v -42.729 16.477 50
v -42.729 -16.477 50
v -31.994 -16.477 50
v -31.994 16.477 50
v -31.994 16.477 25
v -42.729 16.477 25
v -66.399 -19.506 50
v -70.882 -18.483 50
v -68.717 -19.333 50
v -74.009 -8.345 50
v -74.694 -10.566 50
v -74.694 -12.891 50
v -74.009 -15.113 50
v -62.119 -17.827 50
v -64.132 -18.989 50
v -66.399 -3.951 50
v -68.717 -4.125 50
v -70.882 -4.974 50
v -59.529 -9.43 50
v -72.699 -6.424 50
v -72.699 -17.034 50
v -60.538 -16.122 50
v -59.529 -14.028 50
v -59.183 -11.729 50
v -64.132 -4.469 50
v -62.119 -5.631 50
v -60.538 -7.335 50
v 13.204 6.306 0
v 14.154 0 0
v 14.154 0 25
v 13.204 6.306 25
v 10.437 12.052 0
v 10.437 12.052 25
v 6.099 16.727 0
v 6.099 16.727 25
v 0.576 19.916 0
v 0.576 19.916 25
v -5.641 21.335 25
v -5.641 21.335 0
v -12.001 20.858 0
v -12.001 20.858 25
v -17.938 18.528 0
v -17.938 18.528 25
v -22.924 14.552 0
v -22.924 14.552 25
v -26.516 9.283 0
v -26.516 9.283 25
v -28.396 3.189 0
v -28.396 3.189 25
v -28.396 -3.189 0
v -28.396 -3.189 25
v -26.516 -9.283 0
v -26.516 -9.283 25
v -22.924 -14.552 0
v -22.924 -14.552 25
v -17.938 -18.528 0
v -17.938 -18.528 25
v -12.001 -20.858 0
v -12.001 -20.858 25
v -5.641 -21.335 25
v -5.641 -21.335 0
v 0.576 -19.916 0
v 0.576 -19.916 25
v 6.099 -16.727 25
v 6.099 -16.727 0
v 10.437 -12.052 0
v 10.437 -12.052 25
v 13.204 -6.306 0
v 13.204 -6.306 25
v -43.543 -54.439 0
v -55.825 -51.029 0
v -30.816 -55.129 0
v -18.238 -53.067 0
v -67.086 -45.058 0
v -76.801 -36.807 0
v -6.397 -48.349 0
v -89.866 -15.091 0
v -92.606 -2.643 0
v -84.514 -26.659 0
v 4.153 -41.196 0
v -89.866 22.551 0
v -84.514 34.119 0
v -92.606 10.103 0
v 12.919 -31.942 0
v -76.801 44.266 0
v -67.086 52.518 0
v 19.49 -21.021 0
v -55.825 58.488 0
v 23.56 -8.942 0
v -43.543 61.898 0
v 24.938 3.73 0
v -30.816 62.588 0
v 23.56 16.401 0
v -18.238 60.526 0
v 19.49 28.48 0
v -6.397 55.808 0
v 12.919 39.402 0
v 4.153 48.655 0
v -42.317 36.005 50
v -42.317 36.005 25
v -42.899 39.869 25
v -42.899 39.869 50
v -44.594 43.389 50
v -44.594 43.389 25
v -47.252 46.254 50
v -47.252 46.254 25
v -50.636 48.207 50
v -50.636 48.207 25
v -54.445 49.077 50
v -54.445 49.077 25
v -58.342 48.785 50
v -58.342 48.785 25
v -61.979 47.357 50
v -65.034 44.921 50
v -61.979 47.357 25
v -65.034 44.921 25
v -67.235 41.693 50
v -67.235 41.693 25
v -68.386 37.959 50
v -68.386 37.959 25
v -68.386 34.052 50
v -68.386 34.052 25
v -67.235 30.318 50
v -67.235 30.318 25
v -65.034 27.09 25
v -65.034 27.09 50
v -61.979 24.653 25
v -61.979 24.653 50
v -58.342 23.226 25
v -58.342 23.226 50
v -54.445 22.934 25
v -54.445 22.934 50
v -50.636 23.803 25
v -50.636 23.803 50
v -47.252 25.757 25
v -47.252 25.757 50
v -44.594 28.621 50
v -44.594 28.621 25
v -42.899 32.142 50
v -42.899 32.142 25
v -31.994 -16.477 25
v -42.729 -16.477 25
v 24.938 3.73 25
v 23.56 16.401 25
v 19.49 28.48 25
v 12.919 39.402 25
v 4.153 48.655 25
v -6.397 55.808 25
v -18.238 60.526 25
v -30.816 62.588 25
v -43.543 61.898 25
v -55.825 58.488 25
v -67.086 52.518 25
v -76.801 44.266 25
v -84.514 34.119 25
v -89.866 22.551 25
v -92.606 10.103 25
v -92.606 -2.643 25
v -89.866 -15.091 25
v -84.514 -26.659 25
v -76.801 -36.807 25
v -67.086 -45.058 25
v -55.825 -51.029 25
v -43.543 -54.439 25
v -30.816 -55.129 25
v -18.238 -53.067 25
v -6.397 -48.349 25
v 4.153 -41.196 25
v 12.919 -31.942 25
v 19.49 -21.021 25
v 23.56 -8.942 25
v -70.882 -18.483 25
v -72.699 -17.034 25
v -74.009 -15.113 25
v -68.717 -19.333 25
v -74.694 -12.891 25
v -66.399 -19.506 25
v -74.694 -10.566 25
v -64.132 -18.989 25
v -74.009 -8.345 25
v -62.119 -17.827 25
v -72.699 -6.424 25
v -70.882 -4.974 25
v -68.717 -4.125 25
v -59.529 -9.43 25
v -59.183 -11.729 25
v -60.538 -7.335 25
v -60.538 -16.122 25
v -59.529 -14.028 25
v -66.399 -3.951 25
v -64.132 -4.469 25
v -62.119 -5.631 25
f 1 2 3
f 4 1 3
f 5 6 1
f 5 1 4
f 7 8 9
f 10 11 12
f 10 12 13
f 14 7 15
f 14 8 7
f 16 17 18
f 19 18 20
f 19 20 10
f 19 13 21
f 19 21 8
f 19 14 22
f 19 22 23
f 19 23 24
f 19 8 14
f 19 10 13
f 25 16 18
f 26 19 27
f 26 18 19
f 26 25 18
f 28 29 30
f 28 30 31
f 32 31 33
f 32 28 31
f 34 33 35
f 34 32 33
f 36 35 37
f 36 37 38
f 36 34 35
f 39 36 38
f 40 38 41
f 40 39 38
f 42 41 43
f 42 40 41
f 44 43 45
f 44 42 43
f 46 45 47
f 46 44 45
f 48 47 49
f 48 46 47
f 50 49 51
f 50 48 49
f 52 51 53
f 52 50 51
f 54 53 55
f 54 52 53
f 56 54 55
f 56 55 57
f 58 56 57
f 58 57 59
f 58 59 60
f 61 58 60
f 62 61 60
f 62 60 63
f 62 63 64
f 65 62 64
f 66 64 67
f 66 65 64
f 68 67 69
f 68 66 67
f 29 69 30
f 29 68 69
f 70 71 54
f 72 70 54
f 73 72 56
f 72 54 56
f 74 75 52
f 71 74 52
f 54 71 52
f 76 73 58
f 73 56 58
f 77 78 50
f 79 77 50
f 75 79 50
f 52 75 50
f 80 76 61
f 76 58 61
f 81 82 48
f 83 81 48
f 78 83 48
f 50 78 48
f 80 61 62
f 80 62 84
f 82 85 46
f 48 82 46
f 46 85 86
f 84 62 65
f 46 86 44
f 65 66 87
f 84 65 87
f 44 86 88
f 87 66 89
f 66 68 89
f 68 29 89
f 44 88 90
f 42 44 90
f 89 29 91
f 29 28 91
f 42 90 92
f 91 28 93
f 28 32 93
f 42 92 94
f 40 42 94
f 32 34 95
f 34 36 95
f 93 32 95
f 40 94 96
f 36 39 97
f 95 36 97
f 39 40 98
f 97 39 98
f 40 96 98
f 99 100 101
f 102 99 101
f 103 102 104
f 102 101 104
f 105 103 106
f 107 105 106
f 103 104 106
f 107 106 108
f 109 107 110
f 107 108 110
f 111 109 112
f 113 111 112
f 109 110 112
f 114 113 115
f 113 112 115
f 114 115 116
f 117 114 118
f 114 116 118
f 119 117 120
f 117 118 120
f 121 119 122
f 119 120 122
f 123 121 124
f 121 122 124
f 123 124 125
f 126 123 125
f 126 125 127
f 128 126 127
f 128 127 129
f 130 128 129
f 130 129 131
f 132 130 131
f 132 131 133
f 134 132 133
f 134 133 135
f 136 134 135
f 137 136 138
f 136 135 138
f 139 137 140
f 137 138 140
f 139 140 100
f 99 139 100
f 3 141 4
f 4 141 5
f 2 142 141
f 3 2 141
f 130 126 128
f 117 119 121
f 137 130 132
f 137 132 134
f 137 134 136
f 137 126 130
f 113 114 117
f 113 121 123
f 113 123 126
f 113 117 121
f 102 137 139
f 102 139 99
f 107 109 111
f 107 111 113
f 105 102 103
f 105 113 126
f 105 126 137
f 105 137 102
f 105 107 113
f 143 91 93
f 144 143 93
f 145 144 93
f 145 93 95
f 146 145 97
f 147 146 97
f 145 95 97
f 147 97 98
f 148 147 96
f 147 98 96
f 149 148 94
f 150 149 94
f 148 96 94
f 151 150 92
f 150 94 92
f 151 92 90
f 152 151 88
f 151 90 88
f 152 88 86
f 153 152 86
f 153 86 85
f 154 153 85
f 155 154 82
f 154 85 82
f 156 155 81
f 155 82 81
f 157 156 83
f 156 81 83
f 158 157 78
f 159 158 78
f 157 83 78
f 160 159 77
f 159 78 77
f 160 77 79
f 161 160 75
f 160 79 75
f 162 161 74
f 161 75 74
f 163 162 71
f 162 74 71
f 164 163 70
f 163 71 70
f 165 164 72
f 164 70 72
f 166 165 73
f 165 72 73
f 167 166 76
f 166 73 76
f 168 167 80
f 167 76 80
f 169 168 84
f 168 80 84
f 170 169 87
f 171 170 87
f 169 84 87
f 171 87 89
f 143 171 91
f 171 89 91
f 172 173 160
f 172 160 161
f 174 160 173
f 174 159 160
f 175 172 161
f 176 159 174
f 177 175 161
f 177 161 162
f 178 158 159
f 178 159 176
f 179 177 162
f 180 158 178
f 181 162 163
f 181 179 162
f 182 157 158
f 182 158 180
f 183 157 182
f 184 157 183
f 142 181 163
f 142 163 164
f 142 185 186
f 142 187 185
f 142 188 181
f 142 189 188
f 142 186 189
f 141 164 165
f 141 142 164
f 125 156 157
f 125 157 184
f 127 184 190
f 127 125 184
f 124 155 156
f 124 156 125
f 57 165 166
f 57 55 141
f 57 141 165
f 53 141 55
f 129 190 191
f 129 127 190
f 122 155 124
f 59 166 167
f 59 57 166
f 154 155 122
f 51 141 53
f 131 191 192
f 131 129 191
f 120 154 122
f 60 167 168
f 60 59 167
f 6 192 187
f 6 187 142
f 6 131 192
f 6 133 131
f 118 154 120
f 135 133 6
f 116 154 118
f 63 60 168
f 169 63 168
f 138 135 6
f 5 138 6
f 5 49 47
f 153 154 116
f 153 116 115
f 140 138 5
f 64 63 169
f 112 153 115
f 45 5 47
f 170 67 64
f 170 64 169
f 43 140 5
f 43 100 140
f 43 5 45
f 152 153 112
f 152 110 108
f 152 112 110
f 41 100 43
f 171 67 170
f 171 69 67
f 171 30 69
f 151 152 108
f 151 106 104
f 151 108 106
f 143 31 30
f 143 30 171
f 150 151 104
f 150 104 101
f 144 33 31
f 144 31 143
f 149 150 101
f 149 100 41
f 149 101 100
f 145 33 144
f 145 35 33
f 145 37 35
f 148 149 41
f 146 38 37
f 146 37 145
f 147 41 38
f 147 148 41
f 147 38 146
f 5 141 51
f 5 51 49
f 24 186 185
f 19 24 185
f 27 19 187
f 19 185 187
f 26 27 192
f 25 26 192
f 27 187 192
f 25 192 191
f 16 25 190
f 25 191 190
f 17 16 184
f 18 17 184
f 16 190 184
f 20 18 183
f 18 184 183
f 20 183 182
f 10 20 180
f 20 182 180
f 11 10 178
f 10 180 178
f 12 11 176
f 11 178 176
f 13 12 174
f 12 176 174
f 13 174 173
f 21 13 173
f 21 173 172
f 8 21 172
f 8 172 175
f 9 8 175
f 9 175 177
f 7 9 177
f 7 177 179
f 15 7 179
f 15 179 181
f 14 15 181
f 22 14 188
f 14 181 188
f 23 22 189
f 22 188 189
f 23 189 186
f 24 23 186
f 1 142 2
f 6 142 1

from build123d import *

# Parameters (mm, degrees)
F0_R     = 58.94491
F0_R_2   = 21.394651
F1_DEPTH = 25
F2_R     = 7.799399
F2_R_2   = 13.108155
F3_DEPTH = 25
F4_DEPTH = 25
F5_W     = 10.734647
F5_H     = 32.95438
F6_DEPTH = 25


with BuildPart() as f1:
    # F0 (on Top) → F1 (new body)
    with BuildSketch(Plane.XY):
        with Locations((-34.007099, 3.729807)):
            Circle(F0_R)
        with Locations((-7.240221, 0)):
            Circle(F0_R_2, mode=Mode.SUBTRACT)
    extrude(amount=F1_DEPTH)

    # F2 (on face) → F3 (join)
    with BuildSketch(Plane.XY.offset(25)):
        with Locations((-66.981934, -11.72878)):
            Circle(F2_R)
        with Locations((-55.42469, 36.005322)):
            Circle(F2_R_2)
    extrude(amount=F3_DEPTH)

    # F2 (on face) → F4 (join)
    with BuildSketch(Plane.XY.offset(25)):
        with Locations((-66.981934, -11.72878)):
            Circle(F2_R)
    extrude(amount=F4_DEPTH)

    # F5 (on face) → F6 (join)
    with BuildSketch(Plane.XY.offset(25)):
        with Locations((-37.361666, 0)):
            Rectangle(F5_W, F5_H)
    extrude(amount=F6_DEPTH)


solid = f1.part
